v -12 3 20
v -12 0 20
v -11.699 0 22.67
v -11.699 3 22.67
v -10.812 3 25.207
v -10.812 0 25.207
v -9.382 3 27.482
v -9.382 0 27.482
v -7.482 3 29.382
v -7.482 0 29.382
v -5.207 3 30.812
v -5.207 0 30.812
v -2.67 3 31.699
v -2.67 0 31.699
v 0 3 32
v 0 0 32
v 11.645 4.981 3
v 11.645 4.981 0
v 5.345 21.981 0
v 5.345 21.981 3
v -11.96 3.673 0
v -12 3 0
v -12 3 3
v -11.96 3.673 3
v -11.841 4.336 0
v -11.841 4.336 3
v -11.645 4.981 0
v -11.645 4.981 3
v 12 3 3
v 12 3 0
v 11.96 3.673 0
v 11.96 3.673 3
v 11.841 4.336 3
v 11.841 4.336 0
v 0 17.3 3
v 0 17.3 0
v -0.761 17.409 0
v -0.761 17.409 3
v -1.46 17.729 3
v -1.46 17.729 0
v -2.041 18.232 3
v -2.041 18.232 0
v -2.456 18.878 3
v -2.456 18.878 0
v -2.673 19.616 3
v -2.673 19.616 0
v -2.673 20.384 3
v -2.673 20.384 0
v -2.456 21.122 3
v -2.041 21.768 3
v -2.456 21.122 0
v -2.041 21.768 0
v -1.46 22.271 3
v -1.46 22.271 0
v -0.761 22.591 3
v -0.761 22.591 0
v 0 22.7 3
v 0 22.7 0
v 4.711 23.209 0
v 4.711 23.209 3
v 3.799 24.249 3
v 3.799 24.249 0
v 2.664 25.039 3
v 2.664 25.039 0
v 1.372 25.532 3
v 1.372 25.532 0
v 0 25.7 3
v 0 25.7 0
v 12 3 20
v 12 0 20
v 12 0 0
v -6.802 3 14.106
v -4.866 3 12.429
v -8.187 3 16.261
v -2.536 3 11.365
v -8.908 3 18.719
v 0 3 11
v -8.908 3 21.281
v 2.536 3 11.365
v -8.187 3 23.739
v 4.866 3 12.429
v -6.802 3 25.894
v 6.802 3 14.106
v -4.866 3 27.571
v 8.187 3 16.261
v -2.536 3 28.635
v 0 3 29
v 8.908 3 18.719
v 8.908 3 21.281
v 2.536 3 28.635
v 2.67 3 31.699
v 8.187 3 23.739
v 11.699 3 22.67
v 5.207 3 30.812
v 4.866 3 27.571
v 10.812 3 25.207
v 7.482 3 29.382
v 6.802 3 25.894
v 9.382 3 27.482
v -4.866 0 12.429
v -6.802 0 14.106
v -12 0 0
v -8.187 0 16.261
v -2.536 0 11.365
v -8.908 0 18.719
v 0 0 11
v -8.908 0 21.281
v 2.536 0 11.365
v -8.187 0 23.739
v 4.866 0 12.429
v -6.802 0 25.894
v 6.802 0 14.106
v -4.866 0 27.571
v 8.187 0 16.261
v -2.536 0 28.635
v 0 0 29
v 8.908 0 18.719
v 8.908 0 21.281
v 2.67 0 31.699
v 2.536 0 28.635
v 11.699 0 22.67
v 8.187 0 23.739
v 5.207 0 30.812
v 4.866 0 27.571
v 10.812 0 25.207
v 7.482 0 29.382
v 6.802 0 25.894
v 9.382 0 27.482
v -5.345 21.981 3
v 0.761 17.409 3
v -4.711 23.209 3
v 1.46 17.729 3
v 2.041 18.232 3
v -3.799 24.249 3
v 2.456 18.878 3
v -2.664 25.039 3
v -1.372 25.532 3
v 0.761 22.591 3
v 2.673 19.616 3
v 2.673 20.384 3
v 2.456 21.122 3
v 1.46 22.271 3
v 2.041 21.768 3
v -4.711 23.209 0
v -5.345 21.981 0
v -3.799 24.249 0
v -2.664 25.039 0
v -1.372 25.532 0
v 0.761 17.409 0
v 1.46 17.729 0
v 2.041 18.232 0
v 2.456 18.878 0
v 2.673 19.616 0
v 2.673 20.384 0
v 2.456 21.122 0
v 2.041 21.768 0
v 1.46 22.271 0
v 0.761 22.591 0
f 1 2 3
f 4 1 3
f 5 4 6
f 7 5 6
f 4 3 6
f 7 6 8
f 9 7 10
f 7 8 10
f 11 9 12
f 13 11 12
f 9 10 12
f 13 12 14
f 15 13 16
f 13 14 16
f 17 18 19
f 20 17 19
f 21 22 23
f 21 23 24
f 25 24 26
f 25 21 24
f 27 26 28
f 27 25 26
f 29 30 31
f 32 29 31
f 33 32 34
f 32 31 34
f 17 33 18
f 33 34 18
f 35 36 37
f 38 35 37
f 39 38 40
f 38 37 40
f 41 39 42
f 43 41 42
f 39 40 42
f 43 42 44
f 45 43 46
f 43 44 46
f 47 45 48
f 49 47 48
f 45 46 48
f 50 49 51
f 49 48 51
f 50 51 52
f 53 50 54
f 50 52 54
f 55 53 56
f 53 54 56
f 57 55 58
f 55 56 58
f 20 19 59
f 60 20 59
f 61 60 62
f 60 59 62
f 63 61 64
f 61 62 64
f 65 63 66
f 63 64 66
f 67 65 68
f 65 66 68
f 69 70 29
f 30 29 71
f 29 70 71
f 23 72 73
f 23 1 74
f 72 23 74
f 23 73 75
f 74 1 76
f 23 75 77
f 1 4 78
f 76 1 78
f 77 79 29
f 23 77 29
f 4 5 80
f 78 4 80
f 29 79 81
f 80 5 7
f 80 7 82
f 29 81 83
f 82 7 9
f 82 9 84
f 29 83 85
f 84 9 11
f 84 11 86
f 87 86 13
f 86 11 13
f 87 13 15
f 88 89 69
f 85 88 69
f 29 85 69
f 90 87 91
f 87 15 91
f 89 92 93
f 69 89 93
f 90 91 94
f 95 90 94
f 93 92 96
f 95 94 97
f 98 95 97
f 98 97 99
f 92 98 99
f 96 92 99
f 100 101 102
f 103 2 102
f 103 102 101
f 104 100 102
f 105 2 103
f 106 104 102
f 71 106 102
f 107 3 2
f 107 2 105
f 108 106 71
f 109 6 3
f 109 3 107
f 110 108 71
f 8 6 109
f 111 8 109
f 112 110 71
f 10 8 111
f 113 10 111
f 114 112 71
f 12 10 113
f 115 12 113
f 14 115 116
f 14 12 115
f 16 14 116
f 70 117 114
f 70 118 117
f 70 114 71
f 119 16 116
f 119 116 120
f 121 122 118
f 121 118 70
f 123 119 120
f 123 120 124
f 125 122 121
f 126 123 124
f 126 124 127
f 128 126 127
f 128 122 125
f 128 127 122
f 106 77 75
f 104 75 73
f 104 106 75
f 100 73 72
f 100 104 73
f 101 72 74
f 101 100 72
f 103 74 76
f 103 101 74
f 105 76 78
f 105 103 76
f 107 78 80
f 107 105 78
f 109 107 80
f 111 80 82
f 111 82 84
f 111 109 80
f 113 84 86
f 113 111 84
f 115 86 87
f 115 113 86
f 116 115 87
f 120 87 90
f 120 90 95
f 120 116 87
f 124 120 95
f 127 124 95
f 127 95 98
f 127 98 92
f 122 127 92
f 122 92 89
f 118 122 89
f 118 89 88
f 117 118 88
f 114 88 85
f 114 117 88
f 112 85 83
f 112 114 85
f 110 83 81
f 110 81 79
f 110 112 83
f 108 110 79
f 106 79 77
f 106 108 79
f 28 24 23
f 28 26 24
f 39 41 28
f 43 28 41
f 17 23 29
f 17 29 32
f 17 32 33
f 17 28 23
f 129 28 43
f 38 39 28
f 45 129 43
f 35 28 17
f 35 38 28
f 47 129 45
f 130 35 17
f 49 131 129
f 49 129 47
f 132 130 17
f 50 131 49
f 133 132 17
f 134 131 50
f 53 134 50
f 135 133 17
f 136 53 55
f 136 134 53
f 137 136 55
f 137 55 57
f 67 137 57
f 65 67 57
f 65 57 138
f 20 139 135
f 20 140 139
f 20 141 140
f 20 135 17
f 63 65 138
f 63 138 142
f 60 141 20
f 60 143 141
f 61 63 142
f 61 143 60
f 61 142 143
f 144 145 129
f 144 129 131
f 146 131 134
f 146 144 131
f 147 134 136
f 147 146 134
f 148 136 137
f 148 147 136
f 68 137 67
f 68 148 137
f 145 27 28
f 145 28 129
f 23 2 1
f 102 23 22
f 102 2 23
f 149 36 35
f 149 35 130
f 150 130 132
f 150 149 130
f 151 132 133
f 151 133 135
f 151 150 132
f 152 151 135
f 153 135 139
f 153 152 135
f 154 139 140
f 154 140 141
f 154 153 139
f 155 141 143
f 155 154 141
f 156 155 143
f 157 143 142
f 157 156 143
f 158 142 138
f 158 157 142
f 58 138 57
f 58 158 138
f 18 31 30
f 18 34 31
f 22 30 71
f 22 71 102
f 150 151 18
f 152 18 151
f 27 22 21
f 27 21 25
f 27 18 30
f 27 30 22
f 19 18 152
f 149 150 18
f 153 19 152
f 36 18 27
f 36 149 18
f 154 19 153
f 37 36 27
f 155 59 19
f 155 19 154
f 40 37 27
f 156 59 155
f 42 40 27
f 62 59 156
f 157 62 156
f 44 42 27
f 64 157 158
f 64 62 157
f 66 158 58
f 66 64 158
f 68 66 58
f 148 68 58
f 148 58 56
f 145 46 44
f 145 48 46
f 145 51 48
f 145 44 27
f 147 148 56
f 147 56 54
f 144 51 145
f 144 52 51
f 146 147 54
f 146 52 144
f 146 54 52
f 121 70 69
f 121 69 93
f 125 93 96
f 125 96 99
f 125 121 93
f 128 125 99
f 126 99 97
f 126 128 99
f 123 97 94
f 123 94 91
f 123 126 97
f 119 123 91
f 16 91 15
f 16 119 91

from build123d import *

# Parameters (mm, degrees)
PAD_DEPTH    = 3
PAD001_DEPTH = 3


with BuildPart() as part:
    # Sketch → Pad (new body)
    with BuildSketch(Plane.XY):
        with BuildLine():
            ThreePointArc((0, 17.3), (2.7, 20), (0, 22.7))
            Line((0, 25.7), (0, 22.7))
            ThreePointArc((5.344781, 21.980735), (3.255749, 24.678685), (0, 25.7))
            Line((11.644779, 4.980742), (5.344781, 21.980735))
            ThreePointArc((12, 3), (11.910492, 4.006171), (11.644779, 4.980742))
            Line((12, 0), (12, 3))
            Line((0, 0), (12, 0))
            Line((0, 17.3), (0, 0))
        make_face()
    pad = extrude(amount=PAD_DEPTH)

    # Sketch001 → Pad001 (join)
    with BuildSketch(Plane.XZ):
        with BuildLine():
            ThreePointArc((0, 11), (9, 20), (0, 29))
            Line((0, 29), (0, 32))
            ThreePointArc((12, 20.000045), (8.485265, 28.485297), (0, 32))
            Line((12, 20.000045), (12, 3))
            Line((12, 3), (12, 0))
            Line((12, 0), (0, 0))
            Line((0, 0), (0, 11))
        make_face()
    pad001 = extrude(amount=-PAD001_DEPTH)

    # Mirrored: Pad, Pad001 across Sketch V_Axis
    add(pad.mirror(Plane(origin=(0, 0, 0), x_dir=(0, 0, 1), z_dir=(1, 0, 0))))
    add(pad001.mirror(Plane(origin=(0, 0, 0), x_dir=(0, 0, 1), z_dir=(1, 0, 0))))


solid = part.part
